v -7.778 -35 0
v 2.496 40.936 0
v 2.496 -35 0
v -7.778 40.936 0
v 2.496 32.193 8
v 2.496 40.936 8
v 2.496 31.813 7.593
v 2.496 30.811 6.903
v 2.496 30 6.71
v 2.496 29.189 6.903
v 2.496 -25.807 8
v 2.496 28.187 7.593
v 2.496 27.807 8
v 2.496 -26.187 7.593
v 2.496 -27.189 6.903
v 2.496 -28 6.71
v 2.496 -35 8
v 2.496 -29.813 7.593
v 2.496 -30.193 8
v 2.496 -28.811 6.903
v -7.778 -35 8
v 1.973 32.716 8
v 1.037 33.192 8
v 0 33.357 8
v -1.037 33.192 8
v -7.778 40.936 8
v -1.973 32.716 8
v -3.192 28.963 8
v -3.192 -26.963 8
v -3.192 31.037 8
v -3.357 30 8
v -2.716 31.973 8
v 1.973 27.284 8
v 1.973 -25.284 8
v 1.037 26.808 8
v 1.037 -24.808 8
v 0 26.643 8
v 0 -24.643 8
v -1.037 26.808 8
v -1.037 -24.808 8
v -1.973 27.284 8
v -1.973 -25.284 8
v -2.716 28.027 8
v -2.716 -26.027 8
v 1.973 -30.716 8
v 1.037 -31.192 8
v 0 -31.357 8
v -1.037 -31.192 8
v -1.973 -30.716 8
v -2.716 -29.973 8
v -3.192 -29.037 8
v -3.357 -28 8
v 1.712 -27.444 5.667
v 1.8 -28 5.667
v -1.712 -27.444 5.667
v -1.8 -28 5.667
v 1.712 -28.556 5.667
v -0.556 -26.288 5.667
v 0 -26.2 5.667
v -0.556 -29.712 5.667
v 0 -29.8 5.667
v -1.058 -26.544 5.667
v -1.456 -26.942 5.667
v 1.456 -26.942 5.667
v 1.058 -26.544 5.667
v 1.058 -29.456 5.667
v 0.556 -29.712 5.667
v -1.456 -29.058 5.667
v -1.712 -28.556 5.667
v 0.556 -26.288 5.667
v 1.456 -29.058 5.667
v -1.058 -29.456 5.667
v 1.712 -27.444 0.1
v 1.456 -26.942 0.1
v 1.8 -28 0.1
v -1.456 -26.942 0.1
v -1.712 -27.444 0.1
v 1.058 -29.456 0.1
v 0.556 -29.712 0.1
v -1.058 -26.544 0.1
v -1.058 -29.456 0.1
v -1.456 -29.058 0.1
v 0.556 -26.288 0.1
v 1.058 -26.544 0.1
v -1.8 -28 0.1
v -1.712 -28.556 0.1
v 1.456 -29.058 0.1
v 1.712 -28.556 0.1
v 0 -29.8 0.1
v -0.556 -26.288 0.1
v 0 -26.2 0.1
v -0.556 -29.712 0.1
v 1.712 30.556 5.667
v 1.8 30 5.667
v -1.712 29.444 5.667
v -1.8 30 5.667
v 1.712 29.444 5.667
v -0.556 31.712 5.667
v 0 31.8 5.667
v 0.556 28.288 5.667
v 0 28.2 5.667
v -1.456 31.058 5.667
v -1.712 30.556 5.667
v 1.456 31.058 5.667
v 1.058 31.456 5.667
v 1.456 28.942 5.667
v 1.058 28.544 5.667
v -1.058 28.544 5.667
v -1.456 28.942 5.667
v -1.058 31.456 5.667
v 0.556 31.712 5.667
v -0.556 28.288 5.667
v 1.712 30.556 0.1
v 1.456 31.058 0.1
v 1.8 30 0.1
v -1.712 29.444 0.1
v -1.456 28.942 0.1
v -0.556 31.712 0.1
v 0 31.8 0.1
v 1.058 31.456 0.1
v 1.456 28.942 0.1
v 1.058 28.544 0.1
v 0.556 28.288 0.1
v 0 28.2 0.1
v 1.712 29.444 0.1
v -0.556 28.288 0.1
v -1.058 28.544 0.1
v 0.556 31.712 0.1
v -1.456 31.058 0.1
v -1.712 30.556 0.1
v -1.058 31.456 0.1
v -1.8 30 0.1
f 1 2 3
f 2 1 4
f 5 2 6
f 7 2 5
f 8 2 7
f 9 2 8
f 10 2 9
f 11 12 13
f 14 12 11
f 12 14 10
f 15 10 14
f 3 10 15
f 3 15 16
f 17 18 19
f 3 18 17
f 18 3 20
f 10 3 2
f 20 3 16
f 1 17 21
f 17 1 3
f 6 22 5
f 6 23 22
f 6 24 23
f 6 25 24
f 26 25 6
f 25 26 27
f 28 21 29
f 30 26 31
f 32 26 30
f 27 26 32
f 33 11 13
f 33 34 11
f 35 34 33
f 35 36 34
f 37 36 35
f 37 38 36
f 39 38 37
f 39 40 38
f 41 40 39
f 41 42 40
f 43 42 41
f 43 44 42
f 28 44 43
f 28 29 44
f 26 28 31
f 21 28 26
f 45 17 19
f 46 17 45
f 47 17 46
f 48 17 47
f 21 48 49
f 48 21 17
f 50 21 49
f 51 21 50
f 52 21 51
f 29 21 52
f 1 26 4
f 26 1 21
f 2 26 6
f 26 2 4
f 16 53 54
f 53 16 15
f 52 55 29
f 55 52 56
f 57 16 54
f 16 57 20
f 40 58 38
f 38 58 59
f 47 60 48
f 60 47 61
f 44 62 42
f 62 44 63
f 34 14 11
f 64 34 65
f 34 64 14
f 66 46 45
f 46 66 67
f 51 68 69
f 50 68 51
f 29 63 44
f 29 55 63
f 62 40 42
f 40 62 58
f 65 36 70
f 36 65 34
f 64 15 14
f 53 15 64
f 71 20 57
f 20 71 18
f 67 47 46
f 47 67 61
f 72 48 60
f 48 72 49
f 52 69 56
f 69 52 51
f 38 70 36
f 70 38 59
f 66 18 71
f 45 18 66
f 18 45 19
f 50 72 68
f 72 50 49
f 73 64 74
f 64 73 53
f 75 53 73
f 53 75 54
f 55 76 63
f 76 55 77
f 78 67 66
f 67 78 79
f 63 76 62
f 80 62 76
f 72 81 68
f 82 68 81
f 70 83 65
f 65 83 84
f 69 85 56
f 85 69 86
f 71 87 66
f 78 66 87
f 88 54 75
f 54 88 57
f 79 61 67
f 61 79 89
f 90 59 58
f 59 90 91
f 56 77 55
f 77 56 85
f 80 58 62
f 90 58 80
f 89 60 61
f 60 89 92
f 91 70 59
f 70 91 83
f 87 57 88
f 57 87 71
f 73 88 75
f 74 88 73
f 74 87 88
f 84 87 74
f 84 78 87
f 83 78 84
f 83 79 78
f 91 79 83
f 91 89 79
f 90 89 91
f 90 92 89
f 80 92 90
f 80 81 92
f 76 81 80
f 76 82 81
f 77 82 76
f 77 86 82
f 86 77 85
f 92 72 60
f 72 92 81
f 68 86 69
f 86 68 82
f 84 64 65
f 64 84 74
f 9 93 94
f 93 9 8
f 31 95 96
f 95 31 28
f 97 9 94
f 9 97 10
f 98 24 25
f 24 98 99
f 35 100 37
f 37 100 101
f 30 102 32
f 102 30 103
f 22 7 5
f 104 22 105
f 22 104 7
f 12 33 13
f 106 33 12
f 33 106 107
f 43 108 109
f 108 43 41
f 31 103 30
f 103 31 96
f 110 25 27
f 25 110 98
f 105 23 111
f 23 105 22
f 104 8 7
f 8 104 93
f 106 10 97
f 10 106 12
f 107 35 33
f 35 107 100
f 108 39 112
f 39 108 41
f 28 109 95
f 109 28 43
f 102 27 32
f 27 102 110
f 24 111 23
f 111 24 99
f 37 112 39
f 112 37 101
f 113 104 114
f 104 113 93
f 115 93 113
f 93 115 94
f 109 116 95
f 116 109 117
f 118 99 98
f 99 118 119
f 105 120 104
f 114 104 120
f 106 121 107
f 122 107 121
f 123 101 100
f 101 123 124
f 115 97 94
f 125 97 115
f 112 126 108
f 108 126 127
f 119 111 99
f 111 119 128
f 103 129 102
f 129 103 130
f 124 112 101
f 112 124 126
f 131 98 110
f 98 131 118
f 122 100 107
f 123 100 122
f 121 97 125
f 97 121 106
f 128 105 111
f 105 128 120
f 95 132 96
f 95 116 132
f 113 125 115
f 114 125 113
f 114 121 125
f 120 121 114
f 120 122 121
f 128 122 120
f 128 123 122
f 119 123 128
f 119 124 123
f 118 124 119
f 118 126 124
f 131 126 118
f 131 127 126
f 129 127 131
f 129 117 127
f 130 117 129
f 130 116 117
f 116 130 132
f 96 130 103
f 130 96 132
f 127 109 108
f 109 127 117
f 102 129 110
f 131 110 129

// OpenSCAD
// Street Numbers for 3D printing
// Charles Tilford, 2019
// License: CC BY-NC-SA 4.0
//   https://creativecommons.org/licenses/by-nc-sa/4.0/

char="I";     // The number/letter to print

// Units are in mm, except for height of letter

// How many inches high should letter be?
inchesHigh=3;
// How thick/deep should letter be (mm)?
depth=8;

// Character coordinates just center the letter
charX=-18;    // Character X coord
charY=-35;    // Character Y coord
topScrew=30;  // Top screw Y coord
botScrew=-28; // Bottom screw Y coord
height=8;     // Thickness of character
// Screw dimensions. Default presumes
// #6 sheet metal screw
screwWid=3.6; // Width of screw shaft
screwTop=6.78;// Width of screw head
screwCon=5.08;// Height of head 'cone'

// Font to print in. Your system needs this
// installed, of course. If changed the hole
// positions almost certainly need to be
// changed, and maybe charX/charY.
fName="Open Sans Extrabold";
// https://fonts.google.com/specimen/Open+Sans
// Designer: Steve Matteson

// Thin floor below holes. My printer was
// struggling to have the hole 'border' stick
// to the stage. Just drill/screw thru it.
holeFloor=0.1; 

// ==========================================
// ===== All values below are auto-calculated
// ==========================================

// Scaled values
scaleFactor=inchesHigh / 3;
cX=charX * scaleFactor;
cY=charY * scaleFactor;
tS=topScrew * scaleFactor;
bS=botScrew * scaleFactor;
// Where do we start drawing screw head cone?
oS=depth - (screwCon-.05);

difference() {
  // We use difference() to punch out the screw holes
  // in the character
    
  // The character itself, 8mm thick
  translate([cX,cY,0])
    linear_extrude(height=depth, scale=1)
    text(char, size=(75*scaleFactor),
         $fn=100, font=fName);
    
  // Bottom screw hole
  translate([0,bS,oS]) color("red")
    cylinder(h=screwCon, d2=screwTop,
             d1=0, $fn=20);
   translate([0,bS,holeFloor])
    cylinder(h=20, d=screwWid, $fn=20);
    
  // Top screw hole
  translate([0,tS,oS]) color("red")
    cylinder(h=screwCon, d2=screwTop,
             d1=0, $fn=20);
  translate([0,tS,holeFloor])
    cylinder(h=20, d=screwWid, $fn=20);
}

// Colors are just to aid visualization of
// void spaces. $fn is "featuer number", ie how
// many polygons are devoted to object. The values
// above should be near your printing limit anyway.

// Developed in OpenSCAD
//    https://www.openscad.org/
